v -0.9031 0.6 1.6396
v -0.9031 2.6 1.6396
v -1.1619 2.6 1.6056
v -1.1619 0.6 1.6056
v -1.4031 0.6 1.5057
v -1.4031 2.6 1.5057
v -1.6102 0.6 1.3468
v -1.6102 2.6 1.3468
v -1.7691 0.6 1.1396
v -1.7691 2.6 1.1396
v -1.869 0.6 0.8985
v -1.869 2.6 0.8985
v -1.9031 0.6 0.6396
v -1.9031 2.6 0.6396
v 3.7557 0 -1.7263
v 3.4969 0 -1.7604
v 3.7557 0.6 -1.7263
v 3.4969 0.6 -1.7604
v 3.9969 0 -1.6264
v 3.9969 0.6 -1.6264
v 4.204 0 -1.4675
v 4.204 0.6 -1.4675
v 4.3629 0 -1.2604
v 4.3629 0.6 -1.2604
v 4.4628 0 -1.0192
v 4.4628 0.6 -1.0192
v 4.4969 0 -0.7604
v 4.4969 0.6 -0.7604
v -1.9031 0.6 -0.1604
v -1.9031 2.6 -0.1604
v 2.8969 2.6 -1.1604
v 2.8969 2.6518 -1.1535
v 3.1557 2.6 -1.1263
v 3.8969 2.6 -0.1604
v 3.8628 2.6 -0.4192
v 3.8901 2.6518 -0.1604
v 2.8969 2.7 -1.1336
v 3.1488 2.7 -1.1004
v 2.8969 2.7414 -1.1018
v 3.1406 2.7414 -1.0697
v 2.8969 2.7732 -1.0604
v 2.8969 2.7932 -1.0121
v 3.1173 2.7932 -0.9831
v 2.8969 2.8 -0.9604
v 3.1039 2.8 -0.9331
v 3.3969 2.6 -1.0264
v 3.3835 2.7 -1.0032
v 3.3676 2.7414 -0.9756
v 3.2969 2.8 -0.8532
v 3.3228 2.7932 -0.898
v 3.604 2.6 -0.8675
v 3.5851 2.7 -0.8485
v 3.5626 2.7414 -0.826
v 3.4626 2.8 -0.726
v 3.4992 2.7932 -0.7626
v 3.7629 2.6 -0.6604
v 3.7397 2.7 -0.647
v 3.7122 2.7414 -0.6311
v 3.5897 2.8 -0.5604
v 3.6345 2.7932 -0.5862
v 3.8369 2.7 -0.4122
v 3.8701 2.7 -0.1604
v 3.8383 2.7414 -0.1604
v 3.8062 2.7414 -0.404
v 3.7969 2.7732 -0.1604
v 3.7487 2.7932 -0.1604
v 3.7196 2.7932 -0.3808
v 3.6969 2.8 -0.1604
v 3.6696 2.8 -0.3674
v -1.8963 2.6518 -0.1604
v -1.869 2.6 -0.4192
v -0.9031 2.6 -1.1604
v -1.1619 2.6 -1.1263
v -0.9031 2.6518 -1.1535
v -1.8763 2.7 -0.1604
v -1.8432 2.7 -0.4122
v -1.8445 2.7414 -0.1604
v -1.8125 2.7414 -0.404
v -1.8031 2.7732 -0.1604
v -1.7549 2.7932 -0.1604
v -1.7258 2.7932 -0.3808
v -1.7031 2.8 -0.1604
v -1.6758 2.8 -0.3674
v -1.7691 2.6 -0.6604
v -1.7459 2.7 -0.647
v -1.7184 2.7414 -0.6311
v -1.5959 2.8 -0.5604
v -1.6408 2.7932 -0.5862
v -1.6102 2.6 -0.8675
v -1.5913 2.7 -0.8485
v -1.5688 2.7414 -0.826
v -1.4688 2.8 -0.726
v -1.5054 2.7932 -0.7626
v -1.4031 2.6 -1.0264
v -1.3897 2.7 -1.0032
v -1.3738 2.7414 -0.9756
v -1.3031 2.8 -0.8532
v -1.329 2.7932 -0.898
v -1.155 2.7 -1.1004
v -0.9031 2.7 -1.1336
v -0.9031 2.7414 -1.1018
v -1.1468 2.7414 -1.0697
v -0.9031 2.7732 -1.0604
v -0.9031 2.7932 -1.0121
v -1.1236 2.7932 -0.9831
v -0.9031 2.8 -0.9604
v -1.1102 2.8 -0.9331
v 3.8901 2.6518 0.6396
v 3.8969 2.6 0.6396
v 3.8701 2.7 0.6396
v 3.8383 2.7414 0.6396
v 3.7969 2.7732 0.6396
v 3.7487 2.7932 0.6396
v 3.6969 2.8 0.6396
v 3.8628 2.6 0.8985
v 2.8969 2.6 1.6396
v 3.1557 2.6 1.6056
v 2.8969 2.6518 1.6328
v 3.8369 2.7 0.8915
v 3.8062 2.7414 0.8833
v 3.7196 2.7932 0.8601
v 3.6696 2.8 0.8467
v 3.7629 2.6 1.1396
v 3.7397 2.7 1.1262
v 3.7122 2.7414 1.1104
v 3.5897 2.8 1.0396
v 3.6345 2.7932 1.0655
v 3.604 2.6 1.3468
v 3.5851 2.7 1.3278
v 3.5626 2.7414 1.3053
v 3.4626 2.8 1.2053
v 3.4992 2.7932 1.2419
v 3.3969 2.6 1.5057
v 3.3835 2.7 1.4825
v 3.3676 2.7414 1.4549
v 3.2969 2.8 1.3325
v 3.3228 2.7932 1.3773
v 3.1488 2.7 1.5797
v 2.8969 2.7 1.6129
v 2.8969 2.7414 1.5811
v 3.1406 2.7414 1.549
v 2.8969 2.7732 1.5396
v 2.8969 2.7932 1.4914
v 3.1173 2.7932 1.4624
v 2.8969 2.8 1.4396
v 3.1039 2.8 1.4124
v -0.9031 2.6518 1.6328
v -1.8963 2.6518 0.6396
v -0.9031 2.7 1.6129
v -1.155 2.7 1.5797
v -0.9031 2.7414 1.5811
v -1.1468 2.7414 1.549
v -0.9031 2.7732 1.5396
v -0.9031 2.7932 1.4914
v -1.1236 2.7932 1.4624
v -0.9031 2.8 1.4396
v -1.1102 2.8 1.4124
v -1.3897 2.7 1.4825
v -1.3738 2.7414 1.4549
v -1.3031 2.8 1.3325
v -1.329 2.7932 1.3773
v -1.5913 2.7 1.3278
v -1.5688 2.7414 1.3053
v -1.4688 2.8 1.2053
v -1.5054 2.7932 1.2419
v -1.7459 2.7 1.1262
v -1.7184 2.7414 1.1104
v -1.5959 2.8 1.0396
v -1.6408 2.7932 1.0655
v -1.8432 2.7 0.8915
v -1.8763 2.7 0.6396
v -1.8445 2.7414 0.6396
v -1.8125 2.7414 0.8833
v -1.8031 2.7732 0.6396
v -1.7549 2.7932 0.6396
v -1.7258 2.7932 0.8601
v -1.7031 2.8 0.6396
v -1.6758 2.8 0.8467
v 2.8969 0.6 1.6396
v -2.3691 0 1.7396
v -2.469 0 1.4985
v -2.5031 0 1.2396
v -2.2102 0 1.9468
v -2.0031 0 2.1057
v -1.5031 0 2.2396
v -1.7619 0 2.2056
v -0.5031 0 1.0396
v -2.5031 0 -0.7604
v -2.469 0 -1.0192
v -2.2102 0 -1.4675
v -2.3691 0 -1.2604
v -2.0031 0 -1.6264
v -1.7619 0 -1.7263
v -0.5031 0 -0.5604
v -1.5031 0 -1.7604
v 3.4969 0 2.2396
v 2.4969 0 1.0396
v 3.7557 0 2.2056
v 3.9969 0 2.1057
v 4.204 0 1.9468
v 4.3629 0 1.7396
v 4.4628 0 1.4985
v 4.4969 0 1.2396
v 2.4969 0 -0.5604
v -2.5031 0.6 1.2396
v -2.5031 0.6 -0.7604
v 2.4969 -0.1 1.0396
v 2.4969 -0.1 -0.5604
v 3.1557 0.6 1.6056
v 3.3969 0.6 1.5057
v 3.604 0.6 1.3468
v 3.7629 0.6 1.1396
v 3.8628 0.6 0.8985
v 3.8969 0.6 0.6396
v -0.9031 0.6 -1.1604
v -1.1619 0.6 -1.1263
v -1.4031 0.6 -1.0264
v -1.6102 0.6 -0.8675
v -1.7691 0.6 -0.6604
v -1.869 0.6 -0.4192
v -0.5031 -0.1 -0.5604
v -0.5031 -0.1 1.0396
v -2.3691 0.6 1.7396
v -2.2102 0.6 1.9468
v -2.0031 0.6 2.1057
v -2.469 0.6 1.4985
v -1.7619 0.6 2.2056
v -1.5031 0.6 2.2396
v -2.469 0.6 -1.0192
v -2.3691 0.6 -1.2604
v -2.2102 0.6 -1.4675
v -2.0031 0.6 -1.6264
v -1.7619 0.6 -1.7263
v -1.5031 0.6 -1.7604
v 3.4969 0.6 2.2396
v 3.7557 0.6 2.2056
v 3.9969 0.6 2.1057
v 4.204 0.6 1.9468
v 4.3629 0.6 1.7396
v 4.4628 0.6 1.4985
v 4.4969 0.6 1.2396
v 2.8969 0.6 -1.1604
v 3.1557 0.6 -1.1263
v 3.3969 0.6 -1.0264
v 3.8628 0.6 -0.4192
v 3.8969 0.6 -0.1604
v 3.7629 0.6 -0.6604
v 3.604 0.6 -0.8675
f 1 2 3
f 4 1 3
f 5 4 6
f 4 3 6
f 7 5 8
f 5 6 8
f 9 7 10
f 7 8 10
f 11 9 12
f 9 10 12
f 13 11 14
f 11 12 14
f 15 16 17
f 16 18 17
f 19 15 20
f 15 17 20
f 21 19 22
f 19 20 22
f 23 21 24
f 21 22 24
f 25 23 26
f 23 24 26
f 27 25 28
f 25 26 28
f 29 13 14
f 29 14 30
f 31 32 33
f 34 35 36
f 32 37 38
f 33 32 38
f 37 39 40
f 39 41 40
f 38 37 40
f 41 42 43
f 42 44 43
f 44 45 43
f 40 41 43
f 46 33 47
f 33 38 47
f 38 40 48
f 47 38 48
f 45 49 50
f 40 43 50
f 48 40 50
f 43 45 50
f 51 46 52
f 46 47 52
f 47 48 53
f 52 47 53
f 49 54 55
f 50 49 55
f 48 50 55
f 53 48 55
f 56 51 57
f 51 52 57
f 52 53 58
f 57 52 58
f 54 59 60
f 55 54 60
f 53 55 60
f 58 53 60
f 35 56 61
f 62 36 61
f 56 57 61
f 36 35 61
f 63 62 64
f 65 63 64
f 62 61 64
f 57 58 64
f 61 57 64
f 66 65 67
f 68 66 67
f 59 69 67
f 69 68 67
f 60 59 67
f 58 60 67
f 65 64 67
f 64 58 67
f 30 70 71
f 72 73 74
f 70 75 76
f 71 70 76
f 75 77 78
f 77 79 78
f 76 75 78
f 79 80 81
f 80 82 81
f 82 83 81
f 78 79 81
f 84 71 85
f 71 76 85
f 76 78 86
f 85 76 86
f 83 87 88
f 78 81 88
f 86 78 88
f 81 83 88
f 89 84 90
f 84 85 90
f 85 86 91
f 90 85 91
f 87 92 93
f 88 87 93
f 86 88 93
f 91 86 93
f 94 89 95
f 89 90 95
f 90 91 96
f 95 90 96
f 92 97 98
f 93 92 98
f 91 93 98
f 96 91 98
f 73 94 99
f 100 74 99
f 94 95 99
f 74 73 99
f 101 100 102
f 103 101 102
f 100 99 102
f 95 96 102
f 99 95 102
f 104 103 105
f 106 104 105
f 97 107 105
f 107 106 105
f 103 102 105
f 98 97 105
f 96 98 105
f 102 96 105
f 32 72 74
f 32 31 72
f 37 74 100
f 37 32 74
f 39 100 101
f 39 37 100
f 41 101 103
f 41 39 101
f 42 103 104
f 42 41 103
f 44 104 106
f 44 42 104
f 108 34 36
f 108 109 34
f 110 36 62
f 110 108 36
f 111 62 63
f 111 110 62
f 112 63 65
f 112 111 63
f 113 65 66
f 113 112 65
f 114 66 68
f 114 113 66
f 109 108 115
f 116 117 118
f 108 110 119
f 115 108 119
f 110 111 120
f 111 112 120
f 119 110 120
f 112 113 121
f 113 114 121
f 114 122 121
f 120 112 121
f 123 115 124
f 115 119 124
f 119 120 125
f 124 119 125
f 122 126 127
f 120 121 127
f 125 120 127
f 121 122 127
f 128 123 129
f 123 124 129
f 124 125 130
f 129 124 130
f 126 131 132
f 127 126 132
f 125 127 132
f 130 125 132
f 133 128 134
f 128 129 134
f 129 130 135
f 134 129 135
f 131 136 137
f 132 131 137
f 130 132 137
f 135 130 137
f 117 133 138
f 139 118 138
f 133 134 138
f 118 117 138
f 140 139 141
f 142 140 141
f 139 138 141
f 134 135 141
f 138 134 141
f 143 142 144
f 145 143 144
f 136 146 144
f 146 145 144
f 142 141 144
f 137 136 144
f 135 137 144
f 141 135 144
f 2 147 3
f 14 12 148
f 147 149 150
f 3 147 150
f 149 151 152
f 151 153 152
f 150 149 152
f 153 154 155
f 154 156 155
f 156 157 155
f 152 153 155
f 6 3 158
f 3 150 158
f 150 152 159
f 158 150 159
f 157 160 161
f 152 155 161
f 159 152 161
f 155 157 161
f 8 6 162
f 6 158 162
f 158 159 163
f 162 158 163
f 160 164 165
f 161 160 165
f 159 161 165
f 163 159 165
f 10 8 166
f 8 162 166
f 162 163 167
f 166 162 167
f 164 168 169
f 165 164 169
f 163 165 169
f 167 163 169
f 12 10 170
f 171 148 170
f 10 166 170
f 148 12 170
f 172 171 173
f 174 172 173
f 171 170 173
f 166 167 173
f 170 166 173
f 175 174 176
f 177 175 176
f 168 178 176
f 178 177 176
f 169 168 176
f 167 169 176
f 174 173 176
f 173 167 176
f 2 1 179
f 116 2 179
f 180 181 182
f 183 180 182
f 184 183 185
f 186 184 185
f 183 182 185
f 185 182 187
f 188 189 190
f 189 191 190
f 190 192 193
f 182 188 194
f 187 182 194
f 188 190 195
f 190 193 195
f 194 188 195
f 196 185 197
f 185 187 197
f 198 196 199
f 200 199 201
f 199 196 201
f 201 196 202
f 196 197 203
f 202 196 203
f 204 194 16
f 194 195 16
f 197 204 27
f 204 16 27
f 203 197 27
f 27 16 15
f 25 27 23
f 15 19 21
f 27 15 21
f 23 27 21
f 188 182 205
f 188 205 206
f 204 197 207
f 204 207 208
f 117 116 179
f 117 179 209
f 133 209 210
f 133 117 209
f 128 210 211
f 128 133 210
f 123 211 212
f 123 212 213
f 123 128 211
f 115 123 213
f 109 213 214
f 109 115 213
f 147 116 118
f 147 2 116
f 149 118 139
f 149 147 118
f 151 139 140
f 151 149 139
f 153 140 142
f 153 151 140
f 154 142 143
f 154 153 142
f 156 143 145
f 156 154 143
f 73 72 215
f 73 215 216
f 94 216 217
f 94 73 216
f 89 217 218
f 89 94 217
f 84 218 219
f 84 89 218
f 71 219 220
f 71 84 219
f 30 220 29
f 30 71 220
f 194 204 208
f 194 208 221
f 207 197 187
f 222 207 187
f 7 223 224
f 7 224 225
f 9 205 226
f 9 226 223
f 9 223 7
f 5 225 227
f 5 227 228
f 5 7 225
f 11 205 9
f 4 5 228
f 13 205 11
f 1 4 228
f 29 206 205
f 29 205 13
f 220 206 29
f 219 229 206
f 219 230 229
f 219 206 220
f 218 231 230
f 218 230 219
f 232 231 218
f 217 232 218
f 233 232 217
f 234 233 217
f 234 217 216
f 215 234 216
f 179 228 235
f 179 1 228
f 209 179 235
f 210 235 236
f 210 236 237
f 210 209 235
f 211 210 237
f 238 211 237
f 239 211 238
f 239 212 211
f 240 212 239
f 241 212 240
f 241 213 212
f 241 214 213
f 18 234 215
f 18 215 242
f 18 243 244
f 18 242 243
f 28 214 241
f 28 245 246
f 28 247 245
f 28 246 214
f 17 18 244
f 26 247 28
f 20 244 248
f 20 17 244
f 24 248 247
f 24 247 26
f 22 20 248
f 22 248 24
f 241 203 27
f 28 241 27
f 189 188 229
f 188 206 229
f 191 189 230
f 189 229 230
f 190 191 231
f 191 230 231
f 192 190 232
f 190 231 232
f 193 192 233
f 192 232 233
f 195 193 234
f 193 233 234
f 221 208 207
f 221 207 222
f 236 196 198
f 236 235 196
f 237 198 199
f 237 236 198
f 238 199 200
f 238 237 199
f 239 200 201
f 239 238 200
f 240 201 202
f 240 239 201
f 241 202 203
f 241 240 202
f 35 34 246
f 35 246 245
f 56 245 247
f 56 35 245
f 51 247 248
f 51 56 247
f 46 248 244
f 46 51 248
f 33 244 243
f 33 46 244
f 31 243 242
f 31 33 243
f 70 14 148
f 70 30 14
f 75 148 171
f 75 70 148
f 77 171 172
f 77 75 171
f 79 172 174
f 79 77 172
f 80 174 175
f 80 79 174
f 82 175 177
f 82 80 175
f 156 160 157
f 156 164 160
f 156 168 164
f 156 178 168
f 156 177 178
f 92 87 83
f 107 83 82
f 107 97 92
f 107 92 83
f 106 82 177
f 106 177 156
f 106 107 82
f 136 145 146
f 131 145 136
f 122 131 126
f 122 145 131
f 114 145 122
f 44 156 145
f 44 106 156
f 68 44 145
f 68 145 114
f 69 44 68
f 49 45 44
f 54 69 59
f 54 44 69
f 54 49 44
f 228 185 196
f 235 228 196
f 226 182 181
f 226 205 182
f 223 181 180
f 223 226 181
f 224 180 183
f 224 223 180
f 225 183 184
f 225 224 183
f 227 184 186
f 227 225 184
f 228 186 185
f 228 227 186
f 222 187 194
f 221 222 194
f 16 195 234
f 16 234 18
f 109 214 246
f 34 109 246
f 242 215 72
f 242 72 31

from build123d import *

# Parameters (mm, degrees)
SKETCH_1_W      = 7
SKETCH_1_H      = 4
EXTRUDE_1_DEPTH = 0.6
SKETCH_2_W      = 5.8
SKETCH_2_H      = 2.8
EXTRUDE_2_DEPTH = 2.2
FILLET_1_R      = 1
SKETCH_3_W      = 3
SKETCH_3_H      = 1.6
EXTRUDE_3_DEPTH = 0.1
FILLET_2_R      = 0.2


with BuildPart() as part:
    # 草图1 → 凸台-拉伸1 (new body)
    with BuildSketch(Plane(origin=(0, 0, 0), x_dir=(1, 0, 0), z_dir=(0, 1, 0))):
        with Locations((0.996893044, -0.239645207)):
            Rectangle(SKETCH_1_W, SKETCH_1_H)
    extrude(amount=EXTRUDE_1_DEPTH)

    # 草图2 → 凸台-拉伸2 (add)
    with BuildSketch(Plane(origin=(0, 0.6, 0), x_dir=(1, 0, 0), z_dir=(0, 1, 0))):
        with Locations((0.996893044, -0.239645207)):
            Rectangle(SKETCH_2_W, SKETCH_2_H)
    extrude(amount=EXTRUDE_2_DEPTH)

    # 圆角1
    fillet_1_edges = [part.edges().sort_by_distance(p)[0] for p in [
        (3.896893044, 1.7, 1.639645207),
        (3.896893044, 1.7, -1.160354793),
        (-1.903106956, 1.7, -1.160354793),
        (-1.903106956, 1.7, 1.639645207),
        (-2.503106956, 0.3, -1.760354793),
        (4.496893044, 0.3, -1.760354793),
        (4.496893044, 0.3, 2.239645207),
        (-2.503106956, 0.3, 2.239645207),
    ]]
    fillet(fillet_1_edges, radius=FILLET_1_R)

    # 草图3 → 凸台-拉伸3 (add)
    with BuildSketch(Plane(origin=(0, 0, 0), x_dir=(-1, 0, 0), z_dir=(0, -1, 0))):
        with Locations((-0.996893044, -0.239645207)):
            Rectangle(SKETCH_3_W, SKETCH_3_H)
    extrude(amount=EXTRUDE_3_DEPTH)

    # 圆角2
    fillet_2_edges = [part.edges().sort_by_distance(p)[0] for p in [
        (0.996893044, 2.8, -1.160354793),
        (3.896893044, 2.8, 0.239645207),
        (-1.903106956, 2.8, 0.239645207),
        (0.996893044, 2.8, 1.639645207),
        (3.603999825, 2.8, 1.346751988),
        (-1.610213737, 2.8, 1.346751988),
        (-1.610213737, 2.8, -0.867461574),
        (3.603999825, 2.8, -0.867461574),
    ]]
    fillet(fillet_2_edges, radius=FILLET_2_R)


solid = part.part
